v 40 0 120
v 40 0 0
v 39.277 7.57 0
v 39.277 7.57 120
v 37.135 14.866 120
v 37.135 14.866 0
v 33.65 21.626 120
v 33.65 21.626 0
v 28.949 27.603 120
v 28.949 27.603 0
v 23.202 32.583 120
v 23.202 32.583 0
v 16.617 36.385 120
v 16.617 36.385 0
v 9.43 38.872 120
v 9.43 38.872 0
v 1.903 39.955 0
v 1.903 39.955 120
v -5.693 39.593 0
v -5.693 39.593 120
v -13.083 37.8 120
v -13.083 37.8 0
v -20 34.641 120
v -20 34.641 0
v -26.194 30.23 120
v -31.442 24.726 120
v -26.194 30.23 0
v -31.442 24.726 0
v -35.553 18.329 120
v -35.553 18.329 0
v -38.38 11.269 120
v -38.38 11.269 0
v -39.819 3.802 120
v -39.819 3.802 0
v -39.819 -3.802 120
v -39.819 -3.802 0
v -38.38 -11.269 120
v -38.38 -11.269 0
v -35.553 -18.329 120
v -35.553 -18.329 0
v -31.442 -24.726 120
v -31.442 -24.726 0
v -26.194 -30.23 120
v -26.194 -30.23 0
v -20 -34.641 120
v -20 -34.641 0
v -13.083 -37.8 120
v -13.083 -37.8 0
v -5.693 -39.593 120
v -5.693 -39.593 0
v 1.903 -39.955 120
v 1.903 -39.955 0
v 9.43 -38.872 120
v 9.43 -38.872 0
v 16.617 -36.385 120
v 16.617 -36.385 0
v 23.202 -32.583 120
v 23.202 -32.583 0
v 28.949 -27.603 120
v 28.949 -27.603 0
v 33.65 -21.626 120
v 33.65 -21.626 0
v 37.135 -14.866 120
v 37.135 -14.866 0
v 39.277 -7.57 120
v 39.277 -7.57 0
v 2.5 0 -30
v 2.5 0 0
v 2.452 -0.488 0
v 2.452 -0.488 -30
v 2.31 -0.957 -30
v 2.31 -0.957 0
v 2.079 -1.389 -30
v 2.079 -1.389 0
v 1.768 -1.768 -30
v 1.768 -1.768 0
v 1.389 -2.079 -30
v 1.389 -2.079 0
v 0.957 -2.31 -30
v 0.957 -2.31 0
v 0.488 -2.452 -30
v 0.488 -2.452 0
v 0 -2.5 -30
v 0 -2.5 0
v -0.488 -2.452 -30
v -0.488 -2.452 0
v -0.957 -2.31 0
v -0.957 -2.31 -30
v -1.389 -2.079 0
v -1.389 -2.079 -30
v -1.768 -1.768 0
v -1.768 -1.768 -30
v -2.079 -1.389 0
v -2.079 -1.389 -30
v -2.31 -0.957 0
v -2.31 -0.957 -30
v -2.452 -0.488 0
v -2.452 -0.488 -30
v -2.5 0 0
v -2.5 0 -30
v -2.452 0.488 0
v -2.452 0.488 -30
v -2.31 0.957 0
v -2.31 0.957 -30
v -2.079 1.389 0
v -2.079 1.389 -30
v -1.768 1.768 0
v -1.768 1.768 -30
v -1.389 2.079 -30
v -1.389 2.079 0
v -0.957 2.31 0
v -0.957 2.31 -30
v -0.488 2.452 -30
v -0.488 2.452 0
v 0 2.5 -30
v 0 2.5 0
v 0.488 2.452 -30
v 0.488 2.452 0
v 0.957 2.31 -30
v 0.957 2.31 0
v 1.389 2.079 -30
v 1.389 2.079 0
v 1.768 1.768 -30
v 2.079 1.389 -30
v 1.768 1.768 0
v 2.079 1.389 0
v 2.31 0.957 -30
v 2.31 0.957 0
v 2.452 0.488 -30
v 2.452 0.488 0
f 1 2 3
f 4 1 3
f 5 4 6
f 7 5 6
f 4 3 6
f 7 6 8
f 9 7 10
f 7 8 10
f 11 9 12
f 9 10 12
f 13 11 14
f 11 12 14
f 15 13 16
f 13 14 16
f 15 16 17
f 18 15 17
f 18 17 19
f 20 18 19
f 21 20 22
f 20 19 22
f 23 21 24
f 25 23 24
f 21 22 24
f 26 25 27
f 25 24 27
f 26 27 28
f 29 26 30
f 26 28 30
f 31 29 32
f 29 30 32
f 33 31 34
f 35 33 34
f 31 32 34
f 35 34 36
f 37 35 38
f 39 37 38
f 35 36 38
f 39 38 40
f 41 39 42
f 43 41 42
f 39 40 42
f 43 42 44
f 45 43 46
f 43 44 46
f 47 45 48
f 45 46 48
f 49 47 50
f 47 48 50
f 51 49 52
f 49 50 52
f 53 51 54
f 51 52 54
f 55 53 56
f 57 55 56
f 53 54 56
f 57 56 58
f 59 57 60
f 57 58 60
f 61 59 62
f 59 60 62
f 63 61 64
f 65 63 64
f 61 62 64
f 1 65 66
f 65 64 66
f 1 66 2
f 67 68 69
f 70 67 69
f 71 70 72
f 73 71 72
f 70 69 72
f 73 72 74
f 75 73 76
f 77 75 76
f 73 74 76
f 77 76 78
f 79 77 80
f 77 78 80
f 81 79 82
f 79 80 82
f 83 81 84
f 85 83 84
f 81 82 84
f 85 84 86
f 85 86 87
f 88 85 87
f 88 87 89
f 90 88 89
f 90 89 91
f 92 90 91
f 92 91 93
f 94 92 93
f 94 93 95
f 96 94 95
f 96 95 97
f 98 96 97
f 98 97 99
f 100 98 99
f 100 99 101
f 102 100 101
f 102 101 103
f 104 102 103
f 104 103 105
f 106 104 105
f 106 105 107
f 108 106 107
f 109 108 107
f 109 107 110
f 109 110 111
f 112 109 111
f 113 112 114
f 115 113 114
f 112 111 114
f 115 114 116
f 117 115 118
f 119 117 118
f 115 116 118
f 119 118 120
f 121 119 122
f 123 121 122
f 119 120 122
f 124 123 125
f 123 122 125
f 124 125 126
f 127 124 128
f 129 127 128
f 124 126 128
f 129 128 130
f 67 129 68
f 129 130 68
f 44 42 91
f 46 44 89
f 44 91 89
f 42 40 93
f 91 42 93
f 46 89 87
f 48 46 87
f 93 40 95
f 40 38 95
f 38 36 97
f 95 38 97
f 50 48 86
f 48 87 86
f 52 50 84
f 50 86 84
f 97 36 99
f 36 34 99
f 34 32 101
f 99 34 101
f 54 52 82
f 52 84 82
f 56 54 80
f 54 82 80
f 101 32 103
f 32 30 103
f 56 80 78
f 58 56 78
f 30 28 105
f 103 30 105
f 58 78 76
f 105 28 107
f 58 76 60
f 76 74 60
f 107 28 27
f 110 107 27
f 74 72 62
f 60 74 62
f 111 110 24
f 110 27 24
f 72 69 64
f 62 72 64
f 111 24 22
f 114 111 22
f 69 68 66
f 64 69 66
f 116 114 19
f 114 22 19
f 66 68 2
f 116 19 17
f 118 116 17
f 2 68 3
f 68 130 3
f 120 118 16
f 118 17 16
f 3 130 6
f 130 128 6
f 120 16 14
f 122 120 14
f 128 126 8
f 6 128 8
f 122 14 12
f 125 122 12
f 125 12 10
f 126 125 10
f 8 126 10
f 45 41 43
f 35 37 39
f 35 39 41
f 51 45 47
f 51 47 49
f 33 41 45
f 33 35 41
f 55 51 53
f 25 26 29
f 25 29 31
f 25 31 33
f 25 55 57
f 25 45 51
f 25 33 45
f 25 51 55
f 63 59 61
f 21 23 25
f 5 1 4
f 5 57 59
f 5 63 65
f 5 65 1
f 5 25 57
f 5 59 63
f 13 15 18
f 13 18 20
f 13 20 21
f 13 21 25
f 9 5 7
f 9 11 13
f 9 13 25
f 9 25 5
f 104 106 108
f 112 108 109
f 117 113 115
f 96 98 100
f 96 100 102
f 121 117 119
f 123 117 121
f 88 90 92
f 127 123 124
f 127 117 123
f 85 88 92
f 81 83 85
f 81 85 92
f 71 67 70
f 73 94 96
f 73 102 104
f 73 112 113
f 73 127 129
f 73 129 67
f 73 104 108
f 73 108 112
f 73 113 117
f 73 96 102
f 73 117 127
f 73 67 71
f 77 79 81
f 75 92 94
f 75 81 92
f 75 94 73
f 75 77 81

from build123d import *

# Parameters (mm, degrees)
F0_R     = 40
F1_DEPTH = 120
F2_R     = 2.5
F3_DEPTH = 25
F4_DEPTH = 30


with BuildPart() as f1:
    # F0 (on Top) → F1 (new body)
    with BuildSketch(Plane.XY):
        Circle(F0_R)
    extrude(amount=F1_DEPTH)

    # F2 (on face) → F3 (join)
    with BuildSketch(Plane(origin=(0, 0, 0), x_dir=(1, 0, 0), z_dir=(0, 0, -1))):
        Circle(F2_R)
    extrude(amount=F3_DEPTH)

    # F2 (on face) → F4 (join)
    with BuildSketch(Plane(origin=(0, 0, 0), x_dir=(1, 0, 0), z_dir=(0, 0, -1))):
        Circle(F2_R)
    extrude(amount=F4_DEPTH)


solid = f1.part
